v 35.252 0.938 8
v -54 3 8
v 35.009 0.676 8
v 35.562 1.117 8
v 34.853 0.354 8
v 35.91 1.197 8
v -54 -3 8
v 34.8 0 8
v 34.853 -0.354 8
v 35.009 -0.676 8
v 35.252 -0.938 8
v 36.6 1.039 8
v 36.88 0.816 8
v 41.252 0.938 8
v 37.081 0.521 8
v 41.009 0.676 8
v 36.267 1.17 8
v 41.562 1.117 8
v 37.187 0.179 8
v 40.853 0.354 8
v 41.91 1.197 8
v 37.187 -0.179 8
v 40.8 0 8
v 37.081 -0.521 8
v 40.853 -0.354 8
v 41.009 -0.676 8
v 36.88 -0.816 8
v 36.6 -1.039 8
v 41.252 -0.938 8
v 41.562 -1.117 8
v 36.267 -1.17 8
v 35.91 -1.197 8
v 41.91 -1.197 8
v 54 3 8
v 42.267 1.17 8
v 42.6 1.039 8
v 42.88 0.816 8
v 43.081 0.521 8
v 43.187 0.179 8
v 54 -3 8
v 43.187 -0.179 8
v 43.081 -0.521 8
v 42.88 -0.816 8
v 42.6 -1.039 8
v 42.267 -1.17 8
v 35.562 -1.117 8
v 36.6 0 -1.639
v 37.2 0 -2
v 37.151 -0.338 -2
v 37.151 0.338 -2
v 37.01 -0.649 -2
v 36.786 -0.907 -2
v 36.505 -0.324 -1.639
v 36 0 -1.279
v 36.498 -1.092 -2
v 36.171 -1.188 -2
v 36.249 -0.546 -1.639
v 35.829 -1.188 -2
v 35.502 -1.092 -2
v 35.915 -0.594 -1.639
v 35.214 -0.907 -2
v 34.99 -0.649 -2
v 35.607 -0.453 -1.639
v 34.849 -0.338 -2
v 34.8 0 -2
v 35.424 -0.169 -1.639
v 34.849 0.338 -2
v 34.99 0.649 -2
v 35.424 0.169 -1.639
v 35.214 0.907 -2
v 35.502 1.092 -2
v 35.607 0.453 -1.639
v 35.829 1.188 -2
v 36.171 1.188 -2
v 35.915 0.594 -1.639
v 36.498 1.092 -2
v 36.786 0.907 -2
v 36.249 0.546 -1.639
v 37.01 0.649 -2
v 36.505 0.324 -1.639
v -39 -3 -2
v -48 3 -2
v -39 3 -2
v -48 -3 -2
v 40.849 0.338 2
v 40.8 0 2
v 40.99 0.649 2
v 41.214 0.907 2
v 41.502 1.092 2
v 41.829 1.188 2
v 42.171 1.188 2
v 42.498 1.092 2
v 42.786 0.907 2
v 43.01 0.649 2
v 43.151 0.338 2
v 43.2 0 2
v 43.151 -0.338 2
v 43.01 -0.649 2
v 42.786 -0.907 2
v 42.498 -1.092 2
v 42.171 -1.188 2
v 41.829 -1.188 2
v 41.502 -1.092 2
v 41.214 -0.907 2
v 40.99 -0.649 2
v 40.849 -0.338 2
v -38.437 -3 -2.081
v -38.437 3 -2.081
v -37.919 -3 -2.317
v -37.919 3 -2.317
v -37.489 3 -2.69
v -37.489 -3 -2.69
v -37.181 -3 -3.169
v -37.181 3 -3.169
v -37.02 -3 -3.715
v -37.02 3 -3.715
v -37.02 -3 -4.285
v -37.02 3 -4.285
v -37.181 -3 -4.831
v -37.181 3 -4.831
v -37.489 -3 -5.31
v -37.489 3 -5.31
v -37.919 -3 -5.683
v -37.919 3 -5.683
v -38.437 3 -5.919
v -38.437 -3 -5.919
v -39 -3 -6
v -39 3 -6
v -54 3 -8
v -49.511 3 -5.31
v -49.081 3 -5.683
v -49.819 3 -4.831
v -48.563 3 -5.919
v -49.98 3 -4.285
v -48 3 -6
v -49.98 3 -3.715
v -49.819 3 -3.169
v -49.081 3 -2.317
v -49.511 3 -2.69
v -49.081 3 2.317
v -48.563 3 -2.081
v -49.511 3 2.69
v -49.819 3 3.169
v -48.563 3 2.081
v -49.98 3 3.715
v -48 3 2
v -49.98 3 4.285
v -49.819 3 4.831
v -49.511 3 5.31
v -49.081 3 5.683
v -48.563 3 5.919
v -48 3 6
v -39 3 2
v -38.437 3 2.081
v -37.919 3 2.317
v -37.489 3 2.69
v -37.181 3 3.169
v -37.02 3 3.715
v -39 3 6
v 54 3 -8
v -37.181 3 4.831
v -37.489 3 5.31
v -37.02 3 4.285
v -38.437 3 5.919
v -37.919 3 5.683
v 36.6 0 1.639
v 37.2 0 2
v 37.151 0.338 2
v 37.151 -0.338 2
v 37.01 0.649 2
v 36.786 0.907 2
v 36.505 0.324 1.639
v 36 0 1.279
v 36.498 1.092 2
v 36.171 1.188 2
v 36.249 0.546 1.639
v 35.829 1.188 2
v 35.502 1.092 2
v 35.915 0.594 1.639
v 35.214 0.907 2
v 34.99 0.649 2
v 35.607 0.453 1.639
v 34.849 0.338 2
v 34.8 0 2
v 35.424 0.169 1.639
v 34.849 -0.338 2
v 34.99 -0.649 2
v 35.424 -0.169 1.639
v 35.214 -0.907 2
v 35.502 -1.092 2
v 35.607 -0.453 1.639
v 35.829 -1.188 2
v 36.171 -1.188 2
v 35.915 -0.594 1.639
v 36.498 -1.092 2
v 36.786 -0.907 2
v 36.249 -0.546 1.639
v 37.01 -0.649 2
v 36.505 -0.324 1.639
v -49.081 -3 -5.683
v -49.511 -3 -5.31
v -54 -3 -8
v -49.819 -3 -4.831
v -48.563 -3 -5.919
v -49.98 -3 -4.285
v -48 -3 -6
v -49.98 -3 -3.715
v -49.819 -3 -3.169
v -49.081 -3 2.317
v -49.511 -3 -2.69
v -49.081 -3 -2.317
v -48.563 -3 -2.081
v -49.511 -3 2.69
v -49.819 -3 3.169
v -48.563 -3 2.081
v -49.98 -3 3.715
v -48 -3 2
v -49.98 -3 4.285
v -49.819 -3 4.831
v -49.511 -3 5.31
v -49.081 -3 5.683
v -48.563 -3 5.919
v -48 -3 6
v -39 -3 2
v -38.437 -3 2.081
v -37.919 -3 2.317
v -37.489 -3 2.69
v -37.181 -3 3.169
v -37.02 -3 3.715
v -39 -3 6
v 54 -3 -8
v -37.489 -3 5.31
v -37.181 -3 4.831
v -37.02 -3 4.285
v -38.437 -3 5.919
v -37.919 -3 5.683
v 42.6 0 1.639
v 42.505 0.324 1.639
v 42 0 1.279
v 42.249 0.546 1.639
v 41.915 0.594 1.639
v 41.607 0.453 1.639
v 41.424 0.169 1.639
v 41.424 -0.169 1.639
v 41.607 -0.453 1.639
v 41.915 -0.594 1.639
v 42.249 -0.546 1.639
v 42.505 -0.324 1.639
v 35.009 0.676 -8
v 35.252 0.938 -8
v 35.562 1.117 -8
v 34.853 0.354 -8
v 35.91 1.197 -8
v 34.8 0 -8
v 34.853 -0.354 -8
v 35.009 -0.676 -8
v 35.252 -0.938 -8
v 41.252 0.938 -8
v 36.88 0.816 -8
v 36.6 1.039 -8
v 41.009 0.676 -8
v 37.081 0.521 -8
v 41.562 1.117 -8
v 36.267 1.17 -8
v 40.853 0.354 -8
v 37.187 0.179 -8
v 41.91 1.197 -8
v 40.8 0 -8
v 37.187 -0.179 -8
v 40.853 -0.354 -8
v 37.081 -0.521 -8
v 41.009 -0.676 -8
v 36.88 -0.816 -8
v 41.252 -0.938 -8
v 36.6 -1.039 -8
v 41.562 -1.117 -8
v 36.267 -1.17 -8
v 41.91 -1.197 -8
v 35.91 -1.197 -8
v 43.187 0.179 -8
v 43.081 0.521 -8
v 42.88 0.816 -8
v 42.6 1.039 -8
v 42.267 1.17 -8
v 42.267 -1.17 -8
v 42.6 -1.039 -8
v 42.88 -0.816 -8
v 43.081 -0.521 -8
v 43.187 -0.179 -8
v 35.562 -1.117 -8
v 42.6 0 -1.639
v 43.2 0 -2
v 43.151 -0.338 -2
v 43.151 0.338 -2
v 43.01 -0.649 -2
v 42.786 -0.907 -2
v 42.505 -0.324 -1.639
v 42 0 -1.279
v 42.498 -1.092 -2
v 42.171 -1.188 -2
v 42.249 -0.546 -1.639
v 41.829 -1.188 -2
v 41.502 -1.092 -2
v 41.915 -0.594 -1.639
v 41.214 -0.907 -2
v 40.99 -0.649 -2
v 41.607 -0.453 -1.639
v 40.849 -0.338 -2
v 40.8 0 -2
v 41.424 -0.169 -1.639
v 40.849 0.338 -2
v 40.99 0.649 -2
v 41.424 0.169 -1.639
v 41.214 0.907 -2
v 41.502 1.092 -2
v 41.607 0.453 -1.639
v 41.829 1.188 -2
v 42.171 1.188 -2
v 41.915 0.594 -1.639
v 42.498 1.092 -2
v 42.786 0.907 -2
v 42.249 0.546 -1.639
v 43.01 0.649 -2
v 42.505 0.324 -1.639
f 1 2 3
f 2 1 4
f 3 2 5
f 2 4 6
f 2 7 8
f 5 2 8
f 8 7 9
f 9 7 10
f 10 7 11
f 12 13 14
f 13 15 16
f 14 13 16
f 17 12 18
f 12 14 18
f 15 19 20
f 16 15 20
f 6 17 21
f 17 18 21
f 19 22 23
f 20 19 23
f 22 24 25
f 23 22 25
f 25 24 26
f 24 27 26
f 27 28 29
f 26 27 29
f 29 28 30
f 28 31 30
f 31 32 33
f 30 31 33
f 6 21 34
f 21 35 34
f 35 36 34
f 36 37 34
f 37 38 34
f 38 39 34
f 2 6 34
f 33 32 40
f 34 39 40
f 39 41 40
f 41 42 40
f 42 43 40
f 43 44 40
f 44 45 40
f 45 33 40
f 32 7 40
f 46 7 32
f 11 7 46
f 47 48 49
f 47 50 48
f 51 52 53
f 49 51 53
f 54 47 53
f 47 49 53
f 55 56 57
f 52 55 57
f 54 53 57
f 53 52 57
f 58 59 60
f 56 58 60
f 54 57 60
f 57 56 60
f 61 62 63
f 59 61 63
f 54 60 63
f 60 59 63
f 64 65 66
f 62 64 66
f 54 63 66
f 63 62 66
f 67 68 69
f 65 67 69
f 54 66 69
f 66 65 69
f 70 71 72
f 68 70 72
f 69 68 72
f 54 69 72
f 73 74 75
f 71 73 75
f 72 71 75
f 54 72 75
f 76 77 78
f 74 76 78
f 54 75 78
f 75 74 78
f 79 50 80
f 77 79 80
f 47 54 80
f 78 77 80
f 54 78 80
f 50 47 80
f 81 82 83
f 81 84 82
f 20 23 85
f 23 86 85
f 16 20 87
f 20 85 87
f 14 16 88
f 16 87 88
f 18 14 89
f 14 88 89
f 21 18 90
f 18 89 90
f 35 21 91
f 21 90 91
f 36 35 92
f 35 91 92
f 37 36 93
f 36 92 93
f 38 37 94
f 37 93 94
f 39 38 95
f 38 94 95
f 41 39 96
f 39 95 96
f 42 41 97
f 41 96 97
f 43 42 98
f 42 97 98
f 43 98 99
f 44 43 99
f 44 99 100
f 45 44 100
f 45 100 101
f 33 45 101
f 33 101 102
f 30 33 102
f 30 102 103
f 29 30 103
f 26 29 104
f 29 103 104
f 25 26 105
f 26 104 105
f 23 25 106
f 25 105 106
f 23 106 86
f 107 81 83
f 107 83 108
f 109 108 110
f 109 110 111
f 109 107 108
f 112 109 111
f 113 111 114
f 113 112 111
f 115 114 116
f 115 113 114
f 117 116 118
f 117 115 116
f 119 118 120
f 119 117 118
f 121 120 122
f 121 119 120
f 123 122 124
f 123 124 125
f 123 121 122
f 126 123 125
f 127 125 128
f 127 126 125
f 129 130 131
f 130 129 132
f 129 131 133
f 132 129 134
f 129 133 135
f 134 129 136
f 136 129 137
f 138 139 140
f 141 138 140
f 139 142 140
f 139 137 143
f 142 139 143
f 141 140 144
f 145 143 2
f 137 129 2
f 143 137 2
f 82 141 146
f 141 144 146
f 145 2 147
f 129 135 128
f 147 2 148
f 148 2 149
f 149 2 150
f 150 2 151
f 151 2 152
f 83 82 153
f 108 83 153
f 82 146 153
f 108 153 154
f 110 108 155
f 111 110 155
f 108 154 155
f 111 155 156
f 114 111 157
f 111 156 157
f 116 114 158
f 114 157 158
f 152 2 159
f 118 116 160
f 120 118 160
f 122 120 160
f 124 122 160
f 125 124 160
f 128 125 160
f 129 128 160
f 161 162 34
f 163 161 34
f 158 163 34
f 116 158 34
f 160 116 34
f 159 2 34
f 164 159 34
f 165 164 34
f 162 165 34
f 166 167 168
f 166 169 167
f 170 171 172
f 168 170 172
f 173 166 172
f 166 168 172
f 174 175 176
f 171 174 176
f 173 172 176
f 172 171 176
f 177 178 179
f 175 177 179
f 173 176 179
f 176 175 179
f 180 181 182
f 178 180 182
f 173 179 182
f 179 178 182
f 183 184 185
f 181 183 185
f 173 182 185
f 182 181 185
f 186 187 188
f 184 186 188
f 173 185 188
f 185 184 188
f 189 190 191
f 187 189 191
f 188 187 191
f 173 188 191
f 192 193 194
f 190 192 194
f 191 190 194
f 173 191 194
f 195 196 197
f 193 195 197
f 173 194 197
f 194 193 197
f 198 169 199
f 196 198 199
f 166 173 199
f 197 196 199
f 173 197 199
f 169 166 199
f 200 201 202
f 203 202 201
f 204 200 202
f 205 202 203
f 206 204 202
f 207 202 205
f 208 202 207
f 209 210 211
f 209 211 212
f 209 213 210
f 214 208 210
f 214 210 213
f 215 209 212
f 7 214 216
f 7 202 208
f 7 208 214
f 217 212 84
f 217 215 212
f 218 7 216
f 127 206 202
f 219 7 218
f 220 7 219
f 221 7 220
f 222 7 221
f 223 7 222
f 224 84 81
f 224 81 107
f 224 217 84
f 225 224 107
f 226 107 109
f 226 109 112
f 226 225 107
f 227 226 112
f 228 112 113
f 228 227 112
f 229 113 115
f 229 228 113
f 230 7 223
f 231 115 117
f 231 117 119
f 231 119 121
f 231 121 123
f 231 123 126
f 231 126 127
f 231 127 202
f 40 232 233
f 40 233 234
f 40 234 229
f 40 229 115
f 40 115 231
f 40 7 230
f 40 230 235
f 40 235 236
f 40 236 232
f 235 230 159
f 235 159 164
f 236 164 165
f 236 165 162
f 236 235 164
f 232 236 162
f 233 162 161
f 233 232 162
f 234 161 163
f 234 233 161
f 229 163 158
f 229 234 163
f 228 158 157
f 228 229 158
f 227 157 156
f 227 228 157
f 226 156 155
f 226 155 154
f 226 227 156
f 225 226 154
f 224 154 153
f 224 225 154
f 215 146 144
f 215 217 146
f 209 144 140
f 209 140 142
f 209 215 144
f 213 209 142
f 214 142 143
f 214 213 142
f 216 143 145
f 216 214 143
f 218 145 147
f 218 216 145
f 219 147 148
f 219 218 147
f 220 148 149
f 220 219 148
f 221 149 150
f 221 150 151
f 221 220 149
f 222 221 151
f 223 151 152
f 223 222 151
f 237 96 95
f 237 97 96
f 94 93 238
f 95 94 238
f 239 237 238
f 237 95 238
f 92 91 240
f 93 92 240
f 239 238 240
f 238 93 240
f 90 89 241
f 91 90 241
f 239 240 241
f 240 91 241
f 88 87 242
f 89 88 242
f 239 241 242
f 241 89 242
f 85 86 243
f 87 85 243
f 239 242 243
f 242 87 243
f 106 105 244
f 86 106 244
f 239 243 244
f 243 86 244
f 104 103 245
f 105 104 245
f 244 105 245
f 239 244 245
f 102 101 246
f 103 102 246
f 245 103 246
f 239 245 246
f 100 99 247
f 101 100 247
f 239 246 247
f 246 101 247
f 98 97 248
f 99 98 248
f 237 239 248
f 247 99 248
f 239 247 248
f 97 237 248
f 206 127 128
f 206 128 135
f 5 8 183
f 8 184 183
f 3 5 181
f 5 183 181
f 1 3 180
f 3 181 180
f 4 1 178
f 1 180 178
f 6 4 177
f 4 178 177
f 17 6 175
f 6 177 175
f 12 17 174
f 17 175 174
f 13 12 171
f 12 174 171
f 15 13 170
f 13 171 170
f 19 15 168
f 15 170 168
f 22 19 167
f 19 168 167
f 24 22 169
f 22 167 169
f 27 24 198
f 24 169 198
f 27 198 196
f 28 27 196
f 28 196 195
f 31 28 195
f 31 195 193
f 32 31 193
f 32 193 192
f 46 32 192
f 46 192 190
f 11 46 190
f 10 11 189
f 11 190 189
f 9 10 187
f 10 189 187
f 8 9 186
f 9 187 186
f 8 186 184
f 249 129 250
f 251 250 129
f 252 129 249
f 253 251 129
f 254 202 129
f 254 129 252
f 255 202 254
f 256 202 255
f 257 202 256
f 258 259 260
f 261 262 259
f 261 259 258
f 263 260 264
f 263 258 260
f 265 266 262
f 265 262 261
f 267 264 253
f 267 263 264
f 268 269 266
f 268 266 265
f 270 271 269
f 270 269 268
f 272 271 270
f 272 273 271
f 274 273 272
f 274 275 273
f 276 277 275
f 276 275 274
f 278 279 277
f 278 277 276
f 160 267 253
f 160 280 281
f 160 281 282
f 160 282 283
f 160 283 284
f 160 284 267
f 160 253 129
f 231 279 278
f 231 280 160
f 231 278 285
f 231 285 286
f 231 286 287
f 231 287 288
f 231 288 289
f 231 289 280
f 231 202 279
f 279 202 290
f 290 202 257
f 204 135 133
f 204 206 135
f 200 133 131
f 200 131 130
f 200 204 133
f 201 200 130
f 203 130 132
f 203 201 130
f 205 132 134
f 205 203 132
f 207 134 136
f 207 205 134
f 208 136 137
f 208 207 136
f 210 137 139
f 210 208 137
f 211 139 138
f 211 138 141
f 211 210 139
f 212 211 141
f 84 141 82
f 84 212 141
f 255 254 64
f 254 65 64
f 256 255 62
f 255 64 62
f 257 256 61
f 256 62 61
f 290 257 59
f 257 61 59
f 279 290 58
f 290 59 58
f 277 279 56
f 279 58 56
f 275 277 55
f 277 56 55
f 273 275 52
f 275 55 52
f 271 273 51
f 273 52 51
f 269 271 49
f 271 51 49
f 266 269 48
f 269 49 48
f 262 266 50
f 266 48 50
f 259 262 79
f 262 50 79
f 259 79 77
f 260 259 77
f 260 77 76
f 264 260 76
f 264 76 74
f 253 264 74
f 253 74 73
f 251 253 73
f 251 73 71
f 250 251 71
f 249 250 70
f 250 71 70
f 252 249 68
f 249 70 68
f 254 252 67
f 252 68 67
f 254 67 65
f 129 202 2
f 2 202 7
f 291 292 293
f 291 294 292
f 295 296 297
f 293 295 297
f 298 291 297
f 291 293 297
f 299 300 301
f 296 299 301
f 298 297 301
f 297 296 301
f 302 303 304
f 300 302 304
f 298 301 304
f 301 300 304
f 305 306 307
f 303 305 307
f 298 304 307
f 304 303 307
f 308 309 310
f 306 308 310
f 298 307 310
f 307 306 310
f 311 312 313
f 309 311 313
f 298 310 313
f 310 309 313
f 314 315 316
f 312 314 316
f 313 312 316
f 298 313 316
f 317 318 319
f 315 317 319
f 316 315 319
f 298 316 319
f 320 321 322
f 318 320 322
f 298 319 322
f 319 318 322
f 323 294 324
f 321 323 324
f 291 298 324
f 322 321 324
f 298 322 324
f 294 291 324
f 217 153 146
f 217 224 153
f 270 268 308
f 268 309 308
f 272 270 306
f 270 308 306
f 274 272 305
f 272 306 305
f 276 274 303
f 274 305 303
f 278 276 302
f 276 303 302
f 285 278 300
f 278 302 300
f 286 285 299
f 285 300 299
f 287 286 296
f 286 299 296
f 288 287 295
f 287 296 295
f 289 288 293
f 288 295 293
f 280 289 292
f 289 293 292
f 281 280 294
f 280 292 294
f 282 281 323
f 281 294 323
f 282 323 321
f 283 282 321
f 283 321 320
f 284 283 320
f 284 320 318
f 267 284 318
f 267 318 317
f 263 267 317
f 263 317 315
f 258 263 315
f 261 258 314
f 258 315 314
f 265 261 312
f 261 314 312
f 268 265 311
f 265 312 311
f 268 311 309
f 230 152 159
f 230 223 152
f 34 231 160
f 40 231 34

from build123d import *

# Parameters (mm, degrees)
F0_W     = 108
F0_H     = 16
F1_DEPTH = 3
F3_D     = 2.4
F3_DEPTH = 6
F3_TIP   = 0.7210327428
F5_D     = 2.4
F5_DEPTH = 6
F5_TIP   = 0.7210327428


with BuildPart() as f1:
    # F0 (on Front) → F1 (new body, symmetric)
    with BuildSketch(Plane.XZ):
        Rectangle(F0_W, F0_H)
        with BuildLine():
            ThreePointArc((-39, -2), (-37, -4), (-39, -6))
            Line((-39, -6), (-48, -6))
            ThreePointArc((-48, -6), (-50, -4), (-48, -2))
            Line((-48, -2), (-39, -2))
        make_face(mode=Mode.SUBTRACT)
        with BuildLine():
            ThreePointArc((-39, 6), (-37, 4), (-39, 2))
            Line((-39, 2), (-48, 2))
            ThreePointArc((-48, 2), (-50, 4), (-48, 6))
            Line((-48, 6), (-39, 6))
        make_face(mode=Mode.SUBTRACT)
    extrude(amount=F1_DEPTH, both=True)

    # F3
    with Locations(Plane(origin=(0, 0, -8), x_dir=(1, 0, 0), z_dir=(0, 0, -1))):
        with Locations((36, 0), (42, 0)):
            Hole(F3_D / 2, depth=F3_DEPTH)
            with Locations((0, 0, -(F3_DEPTH + F3_TIP / 2))):  # 118° drill point
                Cone(0, F3_D / 2, F3_TIP, mode=Mode.SUBTRACT)

    # F5
    with Locations(Plane.XY.offset(8)):
        with Locations((36, 0), (42, 0)):
            Hole(F5_D / 2, depth=F5_DEPTH)
            with Locations((0, 0, -(F5_DEPTH + F5_TIP / 2))):  # 118° drill point
                Cone(0, F5_D / 2, F5_TIP, mode=Mode.SUBTRACT)


solid = f1.part
